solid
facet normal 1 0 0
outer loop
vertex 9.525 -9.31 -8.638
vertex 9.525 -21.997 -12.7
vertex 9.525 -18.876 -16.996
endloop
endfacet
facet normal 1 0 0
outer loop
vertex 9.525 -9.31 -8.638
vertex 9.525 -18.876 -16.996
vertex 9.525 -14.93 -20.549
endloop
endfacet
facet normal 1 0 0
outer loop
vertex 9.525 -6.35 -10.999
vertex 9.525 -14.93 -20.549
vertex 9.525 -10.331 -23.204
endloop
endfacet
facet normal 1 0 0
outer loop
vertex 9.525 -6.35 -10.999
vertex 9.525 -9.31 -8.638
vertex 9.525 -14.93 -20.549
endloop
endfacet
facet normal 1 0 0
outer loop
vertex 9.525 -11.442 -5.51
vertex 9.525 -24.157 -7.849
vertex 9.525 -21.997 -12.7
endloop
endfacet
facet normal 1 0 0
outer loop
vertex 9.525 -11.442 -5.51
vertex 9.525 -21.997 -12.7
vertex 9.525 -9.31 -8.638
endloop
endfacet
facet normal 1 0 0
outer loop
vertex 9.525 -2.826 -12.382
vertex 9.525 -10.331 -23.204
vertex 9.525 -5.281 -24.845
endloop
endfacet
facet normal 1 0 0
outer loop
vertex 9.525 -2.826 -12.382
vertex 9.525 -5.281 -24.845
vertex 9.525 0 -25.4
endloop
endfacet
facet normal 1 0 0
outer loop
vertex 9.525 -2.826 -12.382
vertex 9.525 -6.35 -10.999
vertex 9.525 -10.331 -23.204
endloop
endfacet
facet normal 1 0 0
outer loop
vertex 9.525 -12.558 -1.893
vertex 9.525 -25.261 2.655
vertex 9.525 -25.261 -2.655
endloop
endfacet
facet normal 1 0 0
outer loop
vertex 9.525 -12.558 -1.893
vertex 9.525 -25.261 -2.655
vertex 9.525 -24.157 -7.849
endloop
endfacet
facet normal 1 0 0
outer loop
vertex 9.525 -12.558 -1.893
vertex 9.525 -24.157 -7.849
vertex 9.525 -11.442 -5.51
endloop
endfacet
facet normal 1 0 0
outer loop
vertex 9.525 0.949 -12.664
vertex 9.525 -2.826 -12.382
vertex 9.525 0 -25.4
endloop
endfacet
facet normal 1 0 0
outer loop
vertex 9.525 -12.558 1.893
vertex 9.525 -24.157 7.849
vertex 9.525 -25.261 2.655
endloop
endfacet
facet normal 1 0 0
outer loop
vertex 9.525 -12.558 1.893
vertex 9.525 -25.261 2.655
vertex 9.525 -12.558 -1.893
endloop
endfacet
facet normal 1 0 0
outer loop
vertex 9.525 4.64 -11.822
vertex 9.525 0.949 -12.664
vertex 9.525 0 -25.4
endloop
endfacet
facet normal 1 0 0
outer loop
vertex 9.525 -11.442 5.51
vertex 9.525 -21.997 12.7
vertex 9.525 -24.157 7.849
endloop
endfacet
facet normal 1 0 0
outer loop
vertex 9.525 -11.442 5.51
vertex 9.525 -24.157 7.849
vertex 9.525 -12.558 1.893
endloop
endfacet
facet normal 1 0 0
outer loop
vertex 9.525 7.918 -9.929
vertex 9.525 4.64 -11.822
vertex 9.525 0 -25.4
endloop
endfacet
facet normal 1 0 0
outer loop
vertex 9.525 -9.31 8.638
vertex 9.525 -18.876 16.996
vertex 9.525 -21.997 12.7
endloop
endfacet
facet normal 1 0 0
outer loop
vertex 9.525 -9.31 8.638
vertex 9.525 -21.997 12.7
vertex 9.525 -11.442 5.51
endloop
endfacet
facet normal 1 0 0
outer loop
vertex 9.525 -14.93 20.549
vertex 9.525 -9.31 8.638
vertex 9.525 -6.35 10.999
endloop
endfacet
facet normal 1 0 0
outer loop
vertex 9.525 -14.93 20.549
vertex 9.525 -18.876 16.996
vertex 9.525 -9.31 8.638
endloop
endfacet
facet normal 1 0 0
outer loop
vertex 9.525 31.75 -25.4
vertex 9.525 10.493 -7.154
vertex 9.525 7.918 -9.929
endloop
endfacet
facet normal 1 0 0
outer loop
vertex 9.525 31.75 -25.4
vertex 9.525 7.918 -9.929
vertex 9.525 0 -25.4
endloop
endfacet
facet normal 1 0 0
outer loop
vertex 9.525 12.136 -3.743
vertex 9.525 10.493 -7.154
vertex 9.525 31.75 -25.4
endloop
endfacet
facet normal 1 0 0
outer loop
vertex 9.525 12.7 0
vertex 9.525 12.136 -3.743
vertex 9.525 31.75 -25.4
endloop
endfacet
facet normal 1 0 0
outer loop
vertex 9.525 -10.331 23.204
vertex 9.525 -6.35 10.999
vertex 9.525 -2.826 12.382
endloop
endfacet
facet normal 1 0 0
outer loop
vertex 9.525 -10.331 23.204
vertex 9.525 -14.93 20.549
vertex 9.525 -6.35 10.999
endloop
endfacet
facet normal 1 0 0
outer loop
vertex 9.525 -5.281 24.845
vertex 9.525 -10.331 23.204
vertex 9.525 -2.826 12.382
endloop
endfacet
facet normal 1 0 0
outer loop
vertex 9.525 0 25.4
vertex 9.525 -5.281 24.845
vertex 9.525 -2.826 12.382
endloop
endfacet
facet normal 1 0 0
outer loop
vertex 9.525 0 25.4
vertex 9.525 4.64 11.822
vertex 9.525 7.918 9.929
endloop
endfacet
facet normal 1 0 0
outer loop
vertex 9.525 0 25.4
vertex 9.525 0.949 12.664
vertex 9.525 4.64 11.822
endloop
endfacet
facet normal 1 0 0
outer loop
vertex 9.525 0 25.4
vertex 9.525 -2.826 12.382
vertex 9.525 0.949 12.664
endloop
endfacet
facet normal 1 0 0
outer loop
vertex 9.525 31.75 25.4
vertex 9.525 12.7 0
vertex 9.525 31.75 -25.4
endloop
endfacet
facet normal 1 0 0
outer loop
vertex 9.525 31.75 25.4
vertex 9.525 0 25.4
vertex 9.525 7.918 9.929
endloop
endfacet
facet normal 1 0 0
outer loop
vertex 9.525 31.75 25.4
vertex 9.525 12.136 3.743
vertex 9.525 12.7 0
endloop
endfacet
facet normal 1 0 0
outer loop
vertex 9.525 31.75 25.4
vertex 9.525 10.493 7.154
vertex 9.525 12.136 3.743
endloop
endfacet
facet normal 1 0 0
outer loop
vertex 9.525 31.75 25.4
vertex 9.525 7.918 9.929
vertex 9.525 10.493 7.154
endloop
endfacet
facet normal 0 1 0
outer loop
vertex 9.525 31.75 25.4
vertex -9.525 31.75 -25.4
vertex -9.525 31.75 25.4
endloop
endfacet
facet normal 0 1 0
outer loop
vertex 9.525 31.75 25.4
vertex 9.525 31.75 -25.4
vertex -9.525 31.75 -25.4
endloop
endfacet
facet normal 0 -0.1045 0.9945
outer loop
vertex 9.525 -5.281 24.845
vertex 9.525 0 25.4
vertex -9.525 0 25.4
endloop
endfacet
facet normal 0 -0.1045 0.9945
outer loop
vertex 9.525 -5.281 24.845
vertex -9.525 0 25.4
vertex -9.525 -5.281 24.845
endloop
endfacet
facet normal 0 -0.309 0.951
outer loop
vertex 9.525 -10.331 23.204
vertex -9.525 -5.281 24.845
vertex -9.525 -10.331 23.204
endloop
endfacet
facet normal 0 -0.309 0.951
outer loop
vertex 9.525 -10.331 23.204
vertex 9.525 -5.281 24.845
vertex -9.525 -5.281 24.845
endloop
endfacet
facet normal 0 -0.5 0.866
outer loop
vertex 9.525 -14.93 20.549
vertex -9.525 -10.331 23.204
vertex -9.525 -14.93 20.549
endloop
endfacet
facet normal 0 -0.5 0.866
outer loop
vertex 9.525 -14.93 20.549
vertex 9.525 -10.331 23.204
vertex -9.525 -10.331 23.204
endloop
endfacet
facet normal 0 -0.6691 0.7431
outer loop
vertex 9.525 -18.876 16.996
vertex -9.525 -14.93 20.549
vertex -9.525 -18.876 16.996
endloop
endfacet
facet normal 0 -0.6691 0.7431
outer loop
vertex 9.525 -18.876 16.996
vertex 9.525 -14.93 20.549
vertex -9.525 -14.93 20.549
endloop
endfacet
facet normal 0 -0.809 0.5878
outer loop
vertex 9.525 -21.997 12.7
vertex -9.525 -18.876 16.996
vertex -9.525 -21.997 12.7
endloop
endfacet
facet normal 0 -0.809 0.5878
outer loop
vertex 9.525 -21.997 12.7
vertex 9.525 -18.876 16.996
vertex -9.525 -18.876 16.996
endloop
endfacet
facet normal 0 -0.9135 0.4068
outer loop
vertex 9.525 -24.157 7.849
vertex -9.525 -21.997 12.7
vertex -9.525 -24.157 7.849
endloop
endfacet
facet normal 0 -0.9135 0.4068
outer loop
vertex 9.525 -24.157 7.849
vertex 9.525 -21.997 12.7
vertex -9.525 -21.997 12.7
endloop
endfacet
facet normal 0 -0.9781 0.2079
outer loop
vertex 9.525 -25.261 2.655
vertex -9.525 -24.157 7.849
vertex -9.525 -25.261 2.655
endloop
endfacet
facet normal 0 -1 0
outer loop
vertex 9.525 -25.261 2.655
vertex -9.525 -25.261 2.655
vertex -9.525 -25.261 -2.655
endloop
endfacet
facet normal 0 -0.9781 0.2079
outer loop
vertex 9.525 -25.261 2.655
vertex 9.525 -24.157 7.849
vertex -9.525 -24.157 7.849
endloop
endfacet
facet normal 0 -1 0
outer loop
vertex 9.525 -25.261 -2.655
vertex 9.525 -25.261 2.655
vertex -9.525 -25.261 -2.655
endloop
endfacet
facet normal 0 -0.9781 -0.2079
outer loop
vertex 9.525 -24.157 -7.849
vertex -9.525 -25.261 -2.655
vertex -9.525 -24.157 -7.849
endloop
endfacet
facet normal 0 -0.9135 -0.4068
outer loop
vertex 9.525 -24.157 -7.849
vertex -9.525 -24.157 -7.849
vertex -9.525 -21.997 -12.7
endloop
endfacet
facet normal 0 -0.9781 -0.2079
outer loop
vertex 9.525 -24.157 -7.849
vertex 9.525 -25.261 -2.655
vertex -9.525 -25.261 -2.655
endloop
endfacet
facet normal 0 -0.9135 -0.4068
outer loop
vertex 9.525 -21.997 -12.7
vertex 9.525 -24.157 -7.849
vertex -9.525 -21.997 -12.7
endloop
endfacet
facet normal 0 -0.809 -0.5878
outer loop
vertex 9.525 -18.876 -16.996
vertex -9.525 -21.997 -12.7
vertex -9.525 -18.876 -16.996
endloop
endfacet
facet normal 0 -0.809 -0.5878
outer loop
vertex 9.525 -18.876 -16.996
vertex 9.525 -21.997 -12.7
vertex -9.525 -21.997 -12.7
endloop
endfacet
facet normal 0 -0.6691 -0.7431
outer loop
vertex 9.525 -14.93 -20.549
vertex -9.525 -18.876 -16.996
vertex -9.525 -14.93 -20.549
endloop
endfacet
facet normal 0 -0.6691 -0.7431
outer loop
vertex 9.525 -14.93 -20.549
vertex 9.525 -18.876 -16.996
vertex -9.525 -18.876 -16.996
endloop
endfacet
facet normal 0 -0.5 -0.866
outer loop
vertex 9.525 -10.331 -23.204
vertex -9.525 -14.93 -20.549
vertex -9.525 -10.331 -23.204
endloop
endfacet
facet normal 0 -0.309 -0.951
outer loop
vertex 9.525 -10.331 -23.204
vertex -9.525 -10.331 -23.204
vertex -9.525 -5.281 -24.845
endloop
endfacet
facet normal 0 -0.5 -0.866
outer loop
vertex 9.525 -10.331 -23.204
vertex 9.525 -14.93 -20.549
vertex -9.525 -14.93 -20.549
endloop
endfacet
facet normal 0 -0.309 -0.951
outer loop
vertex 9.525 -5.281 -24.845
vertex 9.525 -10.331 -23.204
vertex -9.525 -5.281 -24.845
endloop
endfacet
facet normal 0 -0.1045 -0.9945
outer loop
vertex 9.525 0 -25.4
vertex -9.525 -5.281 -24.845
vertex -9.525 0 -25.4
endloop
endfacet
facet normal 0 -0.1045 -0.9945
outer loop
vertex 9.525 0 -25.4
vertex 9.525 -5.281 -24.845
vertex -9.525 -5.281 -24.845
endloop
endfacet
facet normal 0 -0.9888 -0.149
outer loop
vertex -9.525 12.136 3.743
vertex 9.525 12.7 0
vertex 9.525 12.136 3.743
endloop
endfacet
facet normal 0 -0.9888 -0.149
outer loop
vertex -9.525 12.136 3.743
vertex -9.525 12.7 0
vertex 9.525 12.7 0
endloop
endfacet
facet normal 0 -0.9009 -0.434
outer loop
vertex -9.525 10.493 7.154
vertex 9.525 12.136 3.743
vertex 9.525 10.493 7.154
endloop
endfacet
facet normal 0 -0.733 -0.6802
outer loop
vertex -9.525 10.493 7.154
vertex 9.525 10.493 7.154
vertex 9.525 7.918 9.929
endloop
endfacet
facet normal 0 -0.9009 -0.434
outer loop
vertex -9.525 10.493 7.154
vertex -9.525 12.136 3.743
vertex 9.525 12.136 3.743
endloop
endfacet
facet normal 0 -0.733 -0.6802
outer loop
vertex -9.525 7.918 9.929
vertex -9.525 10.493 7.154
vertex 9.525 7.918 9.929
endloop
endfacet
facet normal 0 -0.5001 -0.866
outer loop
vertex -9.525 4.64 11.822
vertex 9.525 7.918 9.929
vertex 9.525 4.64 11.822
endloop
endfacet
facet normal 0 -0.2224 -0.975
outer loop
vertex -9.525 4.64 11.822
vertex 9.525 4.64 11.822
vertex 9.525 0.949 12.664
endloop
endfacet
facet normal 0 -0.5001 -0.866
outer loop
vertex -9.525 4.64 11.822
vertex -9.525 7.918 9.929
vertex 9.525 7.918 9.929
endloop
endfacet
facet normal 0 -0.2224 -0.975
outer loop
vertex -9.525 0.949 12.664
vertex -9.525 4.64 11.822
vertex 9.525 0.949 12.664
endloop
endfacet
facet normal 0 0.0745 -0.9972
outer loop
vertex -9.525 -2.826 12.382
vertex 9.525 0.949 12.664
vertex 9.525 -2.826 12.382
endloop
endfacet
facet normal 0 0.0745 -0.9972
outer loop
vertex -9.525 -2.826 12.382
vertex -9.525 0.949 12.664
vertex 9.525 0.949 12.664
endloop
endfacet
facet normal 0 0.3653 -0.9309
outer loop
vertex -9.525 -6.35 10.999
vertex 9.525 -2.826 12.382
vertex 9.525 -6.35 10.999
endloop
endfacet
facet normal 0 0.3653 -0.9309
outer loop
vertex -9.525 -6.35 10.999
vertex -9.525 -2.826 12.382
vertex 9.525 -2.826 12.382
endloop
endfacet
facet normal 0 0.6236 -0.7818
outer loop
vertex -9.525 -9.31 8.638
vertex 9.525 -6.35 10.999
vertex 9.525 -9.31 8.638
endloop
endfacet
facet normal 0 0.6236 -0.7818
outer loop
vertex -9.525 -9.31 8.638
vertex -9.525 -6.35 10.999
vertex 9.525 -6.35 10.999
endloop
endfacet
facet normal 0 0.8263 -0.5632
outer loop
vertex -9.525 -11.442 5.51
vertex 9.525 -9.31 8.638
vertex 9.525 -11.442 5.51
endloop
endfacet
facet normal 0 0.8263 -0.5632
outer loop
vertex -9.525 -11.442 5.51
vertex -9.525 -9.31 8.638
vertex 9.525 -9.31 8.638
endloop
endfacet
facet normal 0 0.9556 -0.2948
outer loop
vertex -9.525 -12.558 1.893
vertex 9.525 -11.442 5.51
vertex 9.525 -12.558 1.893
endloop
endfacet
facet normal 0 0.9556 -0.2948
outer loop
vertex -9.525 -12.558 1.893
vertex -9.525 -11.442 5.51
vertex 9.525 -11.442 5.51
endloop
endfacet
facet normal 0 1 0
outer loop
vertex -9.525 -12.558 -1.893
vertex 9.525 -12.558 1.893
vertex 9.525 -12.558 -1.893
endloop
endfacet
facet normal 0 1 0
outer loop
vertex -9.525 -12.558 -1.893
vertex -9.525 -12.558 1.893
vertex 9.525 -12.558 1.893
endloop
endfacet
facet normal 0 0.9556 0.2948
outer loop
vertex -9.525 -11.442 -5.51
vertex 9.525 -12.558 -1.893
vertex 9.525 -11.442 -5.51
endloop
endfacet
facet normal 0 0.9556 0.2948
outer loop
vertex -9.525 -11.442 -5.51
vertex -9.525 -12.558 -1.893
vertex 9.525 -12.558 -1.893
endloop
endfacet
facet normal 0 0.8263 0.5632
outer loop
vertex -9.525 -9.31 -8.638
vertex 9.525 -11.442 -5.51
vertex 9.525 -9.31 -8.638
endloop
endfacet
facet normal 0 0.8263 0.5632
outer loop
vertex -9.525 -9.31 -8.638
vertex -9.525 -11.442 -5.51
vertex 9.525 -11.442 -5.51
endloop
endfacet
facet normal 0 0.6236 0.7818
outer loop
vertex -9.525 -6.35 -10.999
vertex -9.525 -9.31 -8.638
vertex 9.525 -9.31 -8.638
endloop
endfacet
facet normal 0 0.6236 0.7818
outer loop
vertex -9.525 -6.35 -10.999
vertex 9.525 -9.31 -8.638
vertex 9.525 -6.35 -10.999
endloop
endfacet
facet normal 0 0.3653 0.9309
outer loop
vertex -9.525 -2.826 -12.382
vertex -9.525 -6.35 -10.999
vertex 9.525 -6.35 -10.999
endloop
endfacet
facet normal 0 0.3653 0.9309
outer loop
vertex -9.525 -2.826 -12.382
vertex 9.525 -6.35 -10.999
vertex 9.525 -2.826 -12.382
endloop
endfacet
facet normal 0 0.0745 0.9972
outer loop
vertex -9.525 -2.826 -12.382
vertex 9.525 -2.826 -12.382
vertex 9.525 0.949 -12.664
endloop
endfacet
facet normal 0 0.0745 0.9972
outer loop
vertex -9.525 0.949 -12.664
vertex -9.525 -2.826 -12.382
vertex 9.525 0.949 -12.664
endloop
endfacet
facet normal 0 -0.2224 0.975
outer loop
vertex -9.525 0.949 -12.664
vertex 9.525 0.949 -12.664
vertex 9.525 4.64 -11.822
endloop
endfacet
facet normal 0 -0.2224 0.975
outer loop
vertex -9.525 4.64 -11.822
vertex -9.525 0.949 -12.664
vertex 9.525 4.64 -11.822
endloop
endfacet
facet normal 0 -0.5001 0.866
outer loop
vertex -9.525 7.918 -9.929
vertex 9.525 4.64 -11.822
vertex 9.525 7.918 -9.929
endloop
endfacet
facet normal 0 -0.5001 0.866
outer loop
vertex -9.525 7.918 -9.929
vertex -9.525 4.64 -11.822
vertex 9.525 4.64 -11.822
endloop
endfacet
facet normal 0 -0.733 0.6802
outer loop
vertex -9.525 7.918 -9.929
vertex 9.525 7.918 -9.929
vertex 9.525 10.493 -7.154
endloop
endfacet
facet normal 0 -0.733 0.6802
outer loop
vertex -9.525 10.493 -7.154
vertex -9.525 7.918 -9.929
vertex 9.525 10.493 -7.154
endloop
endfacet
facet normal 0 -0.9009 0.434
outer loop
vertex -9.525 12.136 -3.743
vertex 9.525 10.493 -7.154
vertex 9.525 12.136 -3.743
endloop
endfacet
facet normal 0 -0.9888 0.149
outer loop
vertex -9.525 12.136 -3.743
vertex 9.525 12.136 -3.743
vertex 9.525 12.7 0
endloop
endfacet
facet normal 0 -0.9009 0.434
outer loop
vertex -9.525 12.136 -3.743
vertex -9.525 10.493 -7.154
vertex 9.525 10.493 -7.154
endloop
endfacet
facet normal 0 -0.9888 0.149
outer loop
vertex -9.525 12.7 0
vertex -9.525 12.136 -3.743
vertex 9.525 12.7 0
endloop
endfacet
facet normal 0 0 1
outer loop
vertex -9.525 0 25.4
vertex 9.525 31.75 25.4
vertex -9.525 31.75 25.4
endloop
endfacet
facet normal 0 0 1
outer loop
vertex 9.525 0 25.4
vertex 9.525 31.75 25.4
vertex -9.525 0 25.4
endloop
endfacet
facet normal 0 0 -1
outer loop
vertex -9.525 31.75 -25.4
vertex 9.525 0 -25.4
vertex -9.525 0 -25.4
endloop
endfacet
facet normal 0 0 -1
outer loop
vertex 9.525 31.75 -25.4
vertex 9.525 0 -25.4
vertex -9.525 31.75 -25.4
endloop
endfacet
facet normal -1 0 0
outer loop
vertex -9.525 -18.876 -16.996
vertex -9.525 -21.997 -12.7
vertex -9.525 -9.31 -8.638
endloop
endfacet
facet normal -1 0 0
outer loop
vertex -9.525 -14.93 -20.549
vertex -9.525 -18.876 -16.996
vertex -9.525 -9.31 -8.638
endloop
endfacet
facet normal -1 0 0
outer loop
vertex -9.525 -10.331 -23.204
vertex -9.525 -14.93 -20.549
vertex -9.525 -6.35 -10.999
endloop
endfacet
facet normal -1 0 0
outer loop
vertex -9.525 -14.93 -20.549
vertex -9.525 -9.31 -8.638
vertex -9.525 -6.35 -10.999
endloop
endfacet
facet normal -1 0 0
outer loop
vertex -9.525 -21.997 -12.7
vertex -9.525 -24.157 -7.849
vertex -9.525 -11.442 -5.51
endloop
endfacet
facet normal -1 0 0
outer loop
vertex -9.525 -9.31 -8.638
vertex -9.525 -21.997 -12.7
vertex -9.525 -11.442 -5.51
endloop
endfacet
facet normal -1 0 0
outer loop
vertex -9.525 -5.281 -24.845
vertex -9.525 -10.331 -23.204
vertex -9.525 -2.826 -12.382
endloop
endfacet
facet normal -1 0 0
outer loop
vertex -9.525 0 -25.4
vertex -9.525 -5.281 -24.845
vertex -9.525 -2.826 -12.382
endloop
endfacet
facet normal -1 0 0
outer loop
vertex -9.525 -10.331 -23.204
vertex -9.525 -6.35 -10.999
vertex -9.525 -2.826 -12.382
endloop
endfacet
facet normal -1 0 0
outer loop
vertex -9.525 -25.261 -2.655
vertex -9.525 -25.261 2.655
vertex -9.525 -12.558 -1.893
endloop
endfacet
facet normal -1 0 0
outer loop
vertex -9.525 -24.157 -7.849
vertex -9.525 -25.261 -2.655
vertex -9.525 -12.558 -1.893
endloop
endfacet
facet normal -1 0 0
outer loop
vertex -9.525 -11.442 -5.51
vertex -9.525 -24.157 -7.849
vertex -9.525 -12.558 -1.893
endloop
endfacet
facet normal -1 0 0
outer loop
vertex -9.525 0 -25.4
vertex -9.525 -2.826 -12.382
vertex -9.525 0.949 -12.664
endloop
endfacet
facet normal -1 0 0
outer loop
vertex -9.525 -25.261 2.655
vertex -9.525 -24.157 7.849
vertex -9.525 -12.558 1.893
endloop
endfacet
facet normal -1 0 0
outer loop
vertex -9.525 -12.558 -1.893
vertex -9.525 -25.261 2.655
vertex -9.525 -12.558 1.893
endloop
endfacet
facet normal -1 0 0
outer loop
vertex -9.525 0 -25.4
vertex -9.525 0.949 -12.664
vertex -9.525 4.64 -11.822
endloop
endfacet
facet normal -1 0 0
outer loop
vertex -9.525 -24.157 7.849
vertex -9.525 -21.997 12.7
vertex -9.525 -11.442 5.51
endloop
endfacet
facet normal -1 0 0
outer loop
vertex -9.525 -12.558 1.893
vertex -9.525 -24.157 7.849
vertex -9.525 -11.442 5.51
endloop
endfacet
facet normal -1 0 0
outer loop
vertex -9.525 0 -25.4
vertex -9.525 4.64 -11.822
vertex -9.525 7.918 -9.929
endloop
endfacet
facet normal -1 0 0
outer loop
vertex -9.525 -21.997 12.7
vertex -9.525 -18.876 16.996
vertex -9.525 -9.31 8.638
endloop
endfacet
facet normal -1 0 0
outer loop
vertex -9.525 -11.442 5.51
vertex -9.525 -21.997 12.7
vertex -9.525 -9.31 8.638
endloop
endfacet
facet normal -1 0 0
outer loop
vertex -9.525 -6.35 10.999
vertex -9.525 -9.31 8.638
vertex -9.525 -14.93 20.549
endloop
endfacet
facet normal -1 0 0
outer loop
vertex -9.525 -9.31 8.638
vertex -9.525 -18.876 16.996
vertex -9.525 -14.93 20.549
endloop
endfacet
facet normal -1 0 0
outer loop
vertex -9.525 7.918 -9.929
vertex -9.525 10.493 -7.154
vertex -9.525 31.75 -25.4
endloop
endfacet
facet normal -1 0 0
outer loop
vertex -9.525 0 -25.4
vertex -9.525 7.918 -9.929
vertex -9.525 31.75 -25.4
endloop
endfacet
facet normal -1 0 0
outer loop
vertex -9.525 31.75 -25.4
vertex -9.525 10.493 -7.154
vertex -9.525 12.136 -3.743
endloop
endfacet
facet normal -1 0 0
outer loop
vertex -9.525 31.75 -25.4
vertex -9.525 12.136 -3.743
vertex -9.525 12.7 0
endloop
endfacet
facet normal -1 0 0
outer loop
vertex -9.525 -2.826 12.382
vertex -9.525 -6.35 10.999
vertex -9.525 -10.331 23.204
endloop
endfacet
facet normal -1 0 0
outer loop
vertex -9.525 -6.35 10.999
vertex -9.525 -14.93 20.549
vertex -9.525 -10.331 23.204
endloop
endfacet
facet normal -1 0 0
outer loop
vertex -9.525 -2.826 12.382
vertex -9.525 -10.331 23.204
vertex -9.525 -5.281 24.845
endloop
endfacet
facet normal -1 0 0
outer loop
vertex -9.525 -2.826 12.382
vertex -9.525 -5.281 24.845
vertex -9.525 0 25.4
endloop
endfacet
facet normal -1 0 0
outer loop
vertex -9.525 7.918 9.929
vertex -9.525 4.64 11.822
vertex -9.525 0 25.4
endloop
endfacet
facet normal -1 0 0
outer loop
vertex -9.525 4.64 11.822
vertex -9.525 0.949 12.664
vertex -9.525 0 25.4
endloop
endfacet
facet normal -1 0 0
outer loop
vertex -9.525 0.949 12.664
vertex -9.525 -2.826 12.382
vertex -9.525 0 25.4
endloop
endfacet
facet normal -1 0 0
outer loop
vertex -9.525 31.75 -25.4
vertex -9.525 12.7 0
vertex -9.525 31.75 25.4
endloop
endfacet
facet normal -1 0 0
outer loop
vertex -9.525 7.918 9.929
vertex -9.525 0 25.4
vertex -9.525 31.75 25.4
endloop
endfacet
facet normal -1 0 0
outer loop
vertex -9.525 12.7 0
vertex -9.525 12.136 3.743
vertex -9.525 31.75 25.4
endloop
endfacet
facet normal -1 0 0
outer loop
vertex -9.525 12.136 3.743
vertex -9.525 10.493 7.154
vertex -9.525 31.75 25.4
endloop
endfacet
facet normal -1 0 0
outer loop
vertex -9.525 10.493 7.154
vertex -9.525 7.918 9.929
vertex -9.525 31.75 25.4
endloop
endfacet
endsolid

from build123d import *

# Parameters (mm, degrees)
F0_R     = 12.7
F1_DEPTH = 9.525


with BuildPart() as f1:
    # F0 (on Right) → F1 (new body, symmetric)
    with BuildSketch(Plane.YZ):
        with BuildLine():
            Line((31.75, 25.4), (0, 25.4))
            ThreePointArc((0, 25.4), (-25.4, 0), (0, -25.4))
            Line((0, -25.4), (31.75, -25.4))
            Line((31.75, -25.4), (31.75, 25.4))
        make_face()
        Circle(F0_R, mode=Mode.SUBTRACT)
    extrude(amount=F1_DEPTH, both=True)


solid = f1.part
